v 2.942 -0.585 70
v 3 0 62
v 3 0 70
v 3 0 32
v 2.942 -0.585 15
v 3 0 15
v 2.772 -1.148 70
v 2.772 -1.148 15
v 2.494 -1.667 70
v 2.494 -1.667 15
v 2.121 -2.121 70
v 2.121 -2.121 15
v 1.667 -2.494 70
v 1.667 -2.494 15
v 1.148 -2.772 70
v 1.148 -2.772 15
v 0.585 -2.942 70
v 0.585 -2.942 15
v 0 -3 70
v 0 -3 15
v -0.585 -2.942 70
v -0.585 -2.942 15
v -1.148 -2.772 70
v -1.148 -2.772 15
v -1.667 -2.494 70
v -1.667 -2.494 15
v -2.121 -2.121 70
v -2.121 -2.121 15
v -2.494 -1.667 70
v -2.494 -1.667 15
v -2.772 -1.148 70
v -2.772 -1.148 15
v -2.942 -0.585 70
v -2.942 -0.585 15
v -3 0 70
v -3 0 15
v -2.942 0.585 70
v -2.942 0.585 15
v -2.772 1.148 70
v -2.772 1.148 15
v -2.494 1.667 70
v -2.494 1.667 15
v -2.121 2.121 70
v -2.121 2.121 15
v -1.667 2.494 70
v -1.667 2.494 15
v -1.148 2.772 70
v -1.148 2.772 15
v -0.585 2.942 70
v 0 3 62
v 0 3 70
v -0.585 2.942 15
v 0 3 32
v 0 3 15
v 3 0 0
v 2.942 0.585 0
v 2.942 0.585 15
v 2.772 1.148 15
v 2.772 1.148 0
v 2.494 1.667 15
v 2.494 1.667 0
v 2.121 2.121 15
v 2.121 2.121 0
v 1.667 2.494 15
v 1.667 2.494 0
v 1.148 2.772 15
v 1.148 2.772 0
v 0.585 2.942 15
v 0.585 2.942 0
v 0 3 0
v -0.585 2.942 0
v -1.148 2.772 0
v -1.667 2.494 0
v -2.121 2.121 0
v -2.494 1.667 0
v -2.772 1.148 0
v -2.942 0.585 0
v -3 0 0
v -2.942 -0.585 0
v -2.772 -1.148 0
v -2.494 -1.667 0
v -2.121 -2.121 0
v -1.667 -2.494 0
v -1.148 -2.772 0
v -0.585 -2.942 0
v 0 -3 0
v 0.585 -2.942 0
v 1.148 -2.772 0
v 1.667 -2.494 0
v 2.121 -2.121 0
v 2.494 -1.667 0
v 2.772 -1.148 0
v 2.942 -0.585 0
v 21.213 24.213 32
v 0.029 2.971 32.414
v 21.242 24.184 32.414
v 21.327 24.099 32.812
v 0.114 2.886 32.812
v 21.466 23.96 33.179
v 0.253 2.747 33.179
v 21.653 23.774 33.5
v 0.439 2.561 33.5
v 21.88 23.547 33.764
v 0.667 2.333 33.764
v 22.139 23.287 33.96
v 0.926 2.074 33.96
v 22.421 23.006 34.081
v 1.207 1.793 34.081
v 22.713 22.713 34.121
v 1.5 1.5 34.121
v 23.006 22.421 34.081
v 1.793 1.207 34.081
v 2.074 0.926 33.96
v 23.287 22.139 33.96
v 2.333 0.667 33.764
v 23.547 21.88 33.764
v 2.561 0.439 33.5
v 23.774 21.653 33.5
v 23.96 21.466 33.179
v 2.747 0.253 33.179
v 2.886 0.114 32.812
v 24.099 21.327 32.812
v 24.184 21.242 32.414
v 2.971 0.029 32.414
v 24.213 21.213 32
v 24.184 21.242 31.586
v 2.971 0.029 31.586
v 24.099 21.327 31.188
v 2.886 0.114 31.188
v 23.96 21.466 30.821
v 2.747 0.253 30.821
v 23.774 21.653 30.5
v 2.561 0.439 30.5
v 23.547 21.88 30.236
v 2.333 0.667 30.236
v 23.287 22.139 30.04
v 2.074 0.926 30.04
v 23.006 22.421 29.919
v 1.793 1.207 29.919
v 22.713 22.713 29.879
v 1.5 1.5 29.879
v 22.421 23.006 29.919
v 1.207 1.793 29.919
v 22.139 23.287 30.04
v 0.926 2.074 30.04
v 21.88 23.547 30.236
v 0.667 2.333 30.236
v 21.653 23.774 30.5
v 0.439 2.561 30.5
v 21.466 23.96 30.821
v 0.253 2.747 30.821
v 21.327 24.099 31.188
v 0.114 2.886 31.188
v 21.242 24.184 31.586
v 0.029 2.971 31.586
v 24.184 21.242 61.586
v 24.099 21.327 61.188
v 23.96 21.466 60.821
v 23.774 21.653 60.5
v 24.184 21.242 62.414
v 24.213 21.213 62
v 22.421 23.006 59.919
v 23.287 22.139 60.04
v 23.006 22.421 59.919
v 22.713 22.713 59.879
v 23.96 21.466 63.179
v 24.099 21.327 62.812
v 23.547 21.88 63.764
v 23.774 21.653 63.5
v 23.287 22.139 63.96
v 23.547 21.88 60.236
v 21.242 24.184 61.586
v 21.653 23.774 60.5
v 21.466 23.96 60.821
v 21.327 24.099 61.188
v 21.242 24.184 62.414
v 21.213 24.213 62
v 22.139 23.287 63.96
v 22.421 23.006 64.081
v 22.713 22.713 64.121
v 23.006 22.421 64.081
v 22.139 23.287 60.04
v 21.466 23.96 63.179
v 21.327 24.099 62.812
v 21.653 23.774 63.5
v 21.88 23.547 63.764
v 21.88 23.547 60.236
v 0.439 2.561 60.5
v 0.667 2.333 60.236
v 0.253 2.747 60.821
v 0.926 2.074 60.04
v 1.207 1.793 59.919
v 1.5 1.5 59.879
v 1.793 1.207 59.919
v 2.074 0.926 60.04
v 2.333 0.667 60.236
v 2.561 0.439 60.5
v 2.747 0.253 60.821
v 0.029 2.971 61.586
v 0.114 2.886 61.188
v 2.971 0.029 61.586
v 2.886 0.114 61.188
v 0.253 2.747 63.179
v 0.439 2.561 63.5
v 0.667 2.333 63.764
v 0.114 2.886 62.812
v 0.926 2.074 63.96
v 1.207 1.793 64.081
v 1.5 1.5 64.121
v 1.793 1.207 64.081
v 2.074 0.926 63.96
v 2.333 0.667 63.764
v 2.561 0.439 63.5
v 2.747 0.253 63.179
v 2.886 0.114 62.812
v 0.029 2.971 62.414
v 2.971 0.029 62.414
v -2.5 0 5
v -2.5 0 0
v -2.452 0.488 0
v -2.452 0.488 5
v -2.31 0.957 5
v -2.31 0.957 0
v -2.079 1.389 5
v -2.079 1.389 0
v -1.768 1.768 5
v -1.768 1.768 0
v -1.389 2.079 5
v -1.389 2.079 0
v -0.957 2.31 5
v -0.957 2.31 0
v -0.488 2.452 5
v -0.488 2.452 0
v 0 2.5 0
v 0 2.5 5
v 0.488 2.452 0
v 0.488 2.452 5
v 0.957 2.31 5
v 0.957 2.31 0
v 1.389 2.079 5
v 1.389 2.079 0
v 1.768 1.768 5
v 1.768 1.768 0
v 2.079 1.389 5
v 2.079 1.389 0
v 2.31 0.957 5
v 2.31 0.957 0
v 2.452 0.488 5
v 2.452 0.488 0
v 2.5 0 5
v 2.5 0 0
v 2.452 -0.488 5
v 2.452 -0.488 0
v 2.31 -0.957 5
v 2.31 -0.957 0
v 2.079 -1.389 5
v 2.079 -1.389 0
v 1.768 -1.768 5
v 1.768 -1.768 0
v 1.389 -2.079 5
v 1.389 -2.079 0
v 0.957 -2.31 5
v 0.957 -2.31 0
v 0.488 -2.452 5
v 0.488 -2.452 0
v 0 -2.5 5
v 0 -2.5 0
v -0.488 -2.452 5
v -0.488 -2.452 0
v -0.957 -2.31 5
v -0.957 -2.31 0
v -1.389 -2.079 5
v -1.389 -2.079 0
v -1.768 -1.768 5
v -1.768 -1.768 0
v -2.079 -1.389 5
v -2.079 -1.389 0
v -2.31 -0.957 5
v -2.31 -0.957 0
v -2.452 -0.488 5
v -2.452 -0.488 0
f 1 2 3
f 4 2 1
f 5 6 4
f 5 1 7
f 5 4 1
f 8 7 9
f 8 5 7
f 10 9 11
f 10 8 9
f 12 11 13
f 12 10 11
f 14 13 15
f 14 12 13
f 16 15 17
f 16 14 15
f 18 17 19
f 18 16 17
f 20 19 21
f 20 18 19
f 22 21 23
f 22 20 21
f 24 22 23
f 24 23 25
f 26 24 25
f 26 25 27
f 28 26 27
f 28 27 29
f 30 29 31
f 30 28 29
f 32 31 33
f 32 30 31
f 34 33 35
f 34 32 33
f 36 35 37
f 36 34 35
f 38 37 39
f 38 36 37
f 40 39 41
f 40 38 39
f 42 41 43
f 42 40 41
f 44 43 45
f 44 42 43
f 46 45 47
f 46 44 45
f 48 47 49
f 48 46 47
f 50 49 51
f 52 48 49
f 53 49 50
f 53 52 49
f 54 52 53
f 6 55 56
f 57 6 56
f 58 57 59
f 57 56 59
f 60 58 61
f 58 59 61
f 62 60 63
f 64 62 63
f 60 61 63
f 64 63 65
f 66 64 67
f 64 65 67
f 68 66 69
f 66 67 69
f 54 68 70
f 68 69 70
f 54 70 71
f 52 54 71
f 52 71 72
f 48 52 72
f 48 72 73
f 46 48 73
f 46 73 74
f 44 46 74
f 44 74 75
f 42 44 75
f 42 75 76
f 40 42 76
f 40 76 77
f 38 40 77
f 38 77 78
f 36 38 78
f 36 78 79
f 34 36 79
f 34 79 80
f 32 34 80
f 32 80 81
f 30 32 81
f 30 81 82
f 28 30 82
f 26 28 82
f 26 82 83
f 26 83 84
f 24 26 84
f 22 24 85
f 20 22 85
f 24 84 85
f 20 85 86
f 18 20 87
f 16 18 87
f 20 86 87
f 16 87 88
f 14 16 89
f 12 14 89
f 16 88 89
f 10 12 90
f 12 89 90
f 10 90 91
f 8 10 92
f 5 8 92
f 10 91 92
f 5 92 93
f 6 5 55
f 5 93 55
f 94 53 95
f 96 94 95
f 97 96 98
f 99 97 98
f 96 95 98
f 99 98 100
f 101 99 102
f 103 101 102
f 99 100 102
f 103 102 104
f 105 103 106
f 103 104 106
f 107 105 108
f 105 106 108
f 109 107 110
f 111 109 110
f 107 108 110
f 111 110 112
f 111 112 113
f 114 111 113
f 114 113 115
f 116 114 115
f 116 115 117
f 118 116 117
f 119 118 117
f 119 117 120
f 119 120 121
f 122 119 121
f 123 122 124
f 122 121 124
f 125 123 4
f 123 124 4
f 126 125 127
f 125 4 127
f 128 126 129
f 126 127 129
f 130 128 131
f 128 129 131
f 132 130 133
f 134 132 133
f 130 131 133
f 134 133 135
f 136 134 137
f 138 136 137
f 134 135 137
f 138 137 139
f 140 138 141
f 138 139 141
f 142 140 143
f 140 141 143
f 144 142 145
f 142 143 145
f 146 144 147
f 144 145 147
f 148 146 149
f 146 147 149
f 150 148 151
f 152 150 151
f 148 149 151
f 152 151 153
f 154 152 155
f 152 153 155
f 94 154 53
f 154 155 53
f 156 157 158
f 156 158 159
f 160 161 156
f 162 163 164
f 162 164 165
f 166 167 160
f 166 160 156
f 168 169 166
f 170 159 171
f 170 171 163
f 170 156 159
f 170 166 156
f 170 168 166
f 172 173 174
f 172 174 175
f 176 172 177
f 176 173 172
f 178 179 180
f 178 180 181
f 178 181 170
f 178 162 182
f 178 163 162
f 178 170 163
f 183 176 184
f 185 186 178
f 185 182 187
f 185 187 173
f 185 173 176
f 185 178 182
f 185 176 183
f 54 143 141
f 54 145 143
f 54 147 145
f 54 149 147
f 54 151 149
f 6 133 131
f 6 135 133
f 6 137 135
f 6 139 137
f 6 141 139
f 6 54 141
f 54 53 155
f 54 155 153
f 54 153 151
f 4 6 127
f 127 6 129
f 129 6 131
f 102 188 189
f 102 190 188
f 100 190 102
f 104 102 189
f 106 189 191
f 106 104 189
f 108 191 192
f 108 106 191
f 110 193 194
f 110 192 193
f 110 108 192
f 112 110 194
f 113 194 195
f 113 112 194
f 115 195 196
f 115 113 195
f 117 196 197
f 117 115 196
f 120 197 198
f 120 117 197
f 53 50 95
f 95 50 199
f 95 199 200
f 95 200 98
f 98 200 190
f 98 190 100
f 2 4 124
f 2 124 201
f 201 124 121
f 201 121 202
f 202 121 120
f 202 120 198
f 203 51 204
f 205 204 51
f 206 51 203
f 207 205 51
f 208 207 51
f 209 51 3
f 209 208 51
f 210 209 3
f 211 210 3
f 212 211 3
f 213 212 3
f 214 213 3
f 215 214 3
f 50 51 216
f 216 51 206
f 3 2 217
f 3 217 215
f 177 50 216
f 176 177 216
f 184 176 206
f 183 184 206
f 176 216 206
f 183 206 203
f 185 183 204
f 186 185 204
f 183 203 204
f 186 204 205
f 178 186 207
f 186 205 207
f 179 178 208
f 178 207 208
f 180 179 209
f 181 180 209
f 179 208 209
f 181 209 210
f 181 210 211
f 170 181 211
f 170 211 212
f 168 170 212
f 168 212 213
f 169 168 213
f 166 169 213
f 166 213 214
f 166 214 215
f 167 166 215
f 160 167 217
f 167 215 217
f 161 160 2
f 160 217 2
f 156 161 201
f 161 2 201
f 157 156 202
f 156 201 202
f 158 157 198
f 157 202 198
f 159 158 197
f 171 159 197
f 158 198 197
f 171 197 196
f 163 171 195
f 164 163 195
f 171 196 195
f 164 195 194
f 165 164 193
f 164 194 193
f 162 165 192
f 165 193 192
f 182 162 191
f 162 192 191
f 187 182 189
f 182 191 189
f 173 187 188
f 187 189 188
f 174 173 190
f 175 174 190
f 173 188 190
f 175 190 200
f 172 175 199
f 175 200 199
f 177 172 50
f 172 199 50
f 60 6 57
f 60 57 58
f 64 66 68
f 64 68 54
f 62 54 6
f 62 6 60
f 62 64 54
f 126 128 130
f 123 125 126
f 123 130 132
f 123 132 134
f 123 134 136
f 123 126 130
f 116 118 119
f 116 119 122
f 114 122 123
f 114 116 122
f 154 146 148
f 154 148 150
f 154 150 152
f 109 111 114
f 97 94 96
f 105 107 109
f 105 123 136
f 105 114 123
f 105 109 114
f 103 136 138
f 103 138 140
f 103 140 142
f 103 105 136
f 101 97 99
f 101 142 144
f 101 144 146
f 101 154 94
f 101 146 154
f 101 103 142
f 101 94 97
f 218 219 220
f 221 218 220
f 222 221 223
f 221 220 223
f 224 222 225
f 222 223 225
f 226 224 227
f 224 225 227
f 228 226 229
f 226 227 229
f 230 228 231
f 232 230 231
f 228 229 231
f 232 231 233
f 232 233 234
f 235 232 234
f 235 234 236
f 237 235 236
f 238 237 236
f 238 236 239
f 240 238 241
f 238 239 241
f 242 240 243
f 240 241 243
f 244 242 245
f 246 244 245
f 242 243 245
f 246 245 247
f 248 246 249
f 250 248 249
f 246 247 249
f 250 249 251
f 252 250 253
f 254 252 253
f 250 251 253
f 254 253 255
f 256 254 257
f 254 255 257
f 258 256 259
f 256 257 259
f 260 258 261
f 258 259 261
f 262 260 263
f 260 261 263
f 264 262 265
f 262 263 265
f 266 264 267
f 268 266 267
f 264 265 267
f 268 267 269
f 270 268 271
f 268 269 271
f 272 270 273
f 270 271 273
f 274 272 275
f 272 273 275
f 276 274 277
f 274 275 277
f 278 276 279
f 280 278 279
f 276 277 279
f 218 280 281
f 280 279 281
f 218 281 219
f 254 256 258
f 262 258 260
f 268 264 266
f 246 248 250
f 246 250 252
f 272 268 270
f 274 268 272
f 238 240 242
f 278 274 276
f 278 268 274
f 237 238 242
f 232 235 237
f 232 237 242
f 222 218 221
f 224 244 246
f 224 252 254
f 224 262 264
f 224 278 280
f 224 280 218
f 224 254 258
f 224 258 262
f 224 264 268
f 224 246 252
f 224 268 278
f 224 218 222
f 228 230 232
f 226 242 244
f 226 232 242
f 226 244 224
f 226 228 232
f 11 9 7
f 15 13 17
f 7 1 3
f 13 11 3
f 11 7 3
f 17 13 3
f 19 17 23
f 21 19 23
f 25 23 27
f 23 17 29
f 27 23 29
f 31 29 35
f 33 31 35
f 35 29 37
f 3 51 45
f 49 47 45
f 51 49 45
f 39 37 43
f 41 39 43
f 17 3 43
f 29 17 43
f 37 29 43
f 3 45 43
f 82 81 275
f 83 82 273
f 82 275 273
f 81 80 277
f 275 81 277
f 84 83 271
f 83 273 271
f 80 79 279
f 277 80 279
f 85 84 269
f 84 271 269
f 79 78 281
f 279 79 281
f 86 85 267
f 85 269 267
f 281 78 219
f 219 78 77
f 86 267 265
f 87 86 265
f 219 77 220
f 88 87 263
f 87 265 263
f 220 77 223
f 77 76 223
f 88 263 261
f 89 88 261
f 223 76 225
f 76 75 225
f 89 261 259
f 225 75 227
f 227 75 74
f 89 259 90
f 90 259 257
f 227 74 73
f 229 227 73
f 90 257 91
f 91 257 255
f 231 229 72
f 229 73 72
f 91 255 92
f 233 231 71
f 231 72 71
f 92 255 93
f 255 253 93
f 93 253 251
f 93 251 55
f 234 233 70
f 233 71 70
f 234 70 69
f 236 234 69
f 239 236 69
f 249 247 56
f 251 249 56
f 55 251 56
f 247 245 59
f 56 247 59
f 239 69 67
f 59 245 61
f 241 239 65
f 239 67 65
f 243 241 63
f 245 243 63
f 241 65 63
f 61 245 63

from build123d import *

# Parameters (mm, degrees)
ESQUISSE1_R             = 3
BOSS_EXTRU_1_DEPTH      = 15
ESQUISSE2_R             = 2.5
ENL_V_MAT_EXTRU_1_DEPTH = 5
BOSS_EXTRU_2_DEPTH      = 55
ESQUISSE4_R             = 2.121320344
BOSS_EXTRU_3_DEPTH      = 30


with BuildPart() as part:
    # Esquisse1 → Boss.-Extru.1 (new body)
    with BuildSketch(Plane.XY):
        Circle(ESQUISSE1_R)
    extrude(amount=BOSS_EXTRU_1_DEPTH)

    # Esquisse2 → Enlèv. mat.-Extru.1 (cut)
    with BuildSketch(Plane(origin=(0, 0, 0), x_dir=(-1, 0, 0), z_dir=(0, 0, -1))):
        Circle(ESQUISSE2_R)
    extrude(amount=-ENL_V_MAT_EXTRU_1_DEPTH, mode=Mode.SUBTRACT)

    # Esquisse3 → Boss.-Extru.2 (add)
    with BuildSketch(Plane.XY.offset(15)):
        with BuildLine():
            Line((0, 3), (3, 0))
            ThreePointArc((3, 0), (-2.121320344, -2.121320344), (0, 3))
        make_face()
    extrude(amount=BOSS_EXTRU_2_DEPTH)

    # Esquisse4 → Boss.-Extru.3 (add)
    with BuildSketch(Plane(origin=(1.5, 1.5, 0), x_dir=(0, 0, -1), z_dir=(0.7071067811865477, 0.7071067811865475, 0))):
        with Locations(Location((-62, 0, 0), (0, 0, 90))):
            Circle(ESQUISSE4_R)
        with Locations(Location((-32, 0, 0), (0, 0, 90))):
            Circle(ESQUISSE4_R)
    extrude(amount=BOSS_EXTRU_3_DEPTH)


solid = part.part
